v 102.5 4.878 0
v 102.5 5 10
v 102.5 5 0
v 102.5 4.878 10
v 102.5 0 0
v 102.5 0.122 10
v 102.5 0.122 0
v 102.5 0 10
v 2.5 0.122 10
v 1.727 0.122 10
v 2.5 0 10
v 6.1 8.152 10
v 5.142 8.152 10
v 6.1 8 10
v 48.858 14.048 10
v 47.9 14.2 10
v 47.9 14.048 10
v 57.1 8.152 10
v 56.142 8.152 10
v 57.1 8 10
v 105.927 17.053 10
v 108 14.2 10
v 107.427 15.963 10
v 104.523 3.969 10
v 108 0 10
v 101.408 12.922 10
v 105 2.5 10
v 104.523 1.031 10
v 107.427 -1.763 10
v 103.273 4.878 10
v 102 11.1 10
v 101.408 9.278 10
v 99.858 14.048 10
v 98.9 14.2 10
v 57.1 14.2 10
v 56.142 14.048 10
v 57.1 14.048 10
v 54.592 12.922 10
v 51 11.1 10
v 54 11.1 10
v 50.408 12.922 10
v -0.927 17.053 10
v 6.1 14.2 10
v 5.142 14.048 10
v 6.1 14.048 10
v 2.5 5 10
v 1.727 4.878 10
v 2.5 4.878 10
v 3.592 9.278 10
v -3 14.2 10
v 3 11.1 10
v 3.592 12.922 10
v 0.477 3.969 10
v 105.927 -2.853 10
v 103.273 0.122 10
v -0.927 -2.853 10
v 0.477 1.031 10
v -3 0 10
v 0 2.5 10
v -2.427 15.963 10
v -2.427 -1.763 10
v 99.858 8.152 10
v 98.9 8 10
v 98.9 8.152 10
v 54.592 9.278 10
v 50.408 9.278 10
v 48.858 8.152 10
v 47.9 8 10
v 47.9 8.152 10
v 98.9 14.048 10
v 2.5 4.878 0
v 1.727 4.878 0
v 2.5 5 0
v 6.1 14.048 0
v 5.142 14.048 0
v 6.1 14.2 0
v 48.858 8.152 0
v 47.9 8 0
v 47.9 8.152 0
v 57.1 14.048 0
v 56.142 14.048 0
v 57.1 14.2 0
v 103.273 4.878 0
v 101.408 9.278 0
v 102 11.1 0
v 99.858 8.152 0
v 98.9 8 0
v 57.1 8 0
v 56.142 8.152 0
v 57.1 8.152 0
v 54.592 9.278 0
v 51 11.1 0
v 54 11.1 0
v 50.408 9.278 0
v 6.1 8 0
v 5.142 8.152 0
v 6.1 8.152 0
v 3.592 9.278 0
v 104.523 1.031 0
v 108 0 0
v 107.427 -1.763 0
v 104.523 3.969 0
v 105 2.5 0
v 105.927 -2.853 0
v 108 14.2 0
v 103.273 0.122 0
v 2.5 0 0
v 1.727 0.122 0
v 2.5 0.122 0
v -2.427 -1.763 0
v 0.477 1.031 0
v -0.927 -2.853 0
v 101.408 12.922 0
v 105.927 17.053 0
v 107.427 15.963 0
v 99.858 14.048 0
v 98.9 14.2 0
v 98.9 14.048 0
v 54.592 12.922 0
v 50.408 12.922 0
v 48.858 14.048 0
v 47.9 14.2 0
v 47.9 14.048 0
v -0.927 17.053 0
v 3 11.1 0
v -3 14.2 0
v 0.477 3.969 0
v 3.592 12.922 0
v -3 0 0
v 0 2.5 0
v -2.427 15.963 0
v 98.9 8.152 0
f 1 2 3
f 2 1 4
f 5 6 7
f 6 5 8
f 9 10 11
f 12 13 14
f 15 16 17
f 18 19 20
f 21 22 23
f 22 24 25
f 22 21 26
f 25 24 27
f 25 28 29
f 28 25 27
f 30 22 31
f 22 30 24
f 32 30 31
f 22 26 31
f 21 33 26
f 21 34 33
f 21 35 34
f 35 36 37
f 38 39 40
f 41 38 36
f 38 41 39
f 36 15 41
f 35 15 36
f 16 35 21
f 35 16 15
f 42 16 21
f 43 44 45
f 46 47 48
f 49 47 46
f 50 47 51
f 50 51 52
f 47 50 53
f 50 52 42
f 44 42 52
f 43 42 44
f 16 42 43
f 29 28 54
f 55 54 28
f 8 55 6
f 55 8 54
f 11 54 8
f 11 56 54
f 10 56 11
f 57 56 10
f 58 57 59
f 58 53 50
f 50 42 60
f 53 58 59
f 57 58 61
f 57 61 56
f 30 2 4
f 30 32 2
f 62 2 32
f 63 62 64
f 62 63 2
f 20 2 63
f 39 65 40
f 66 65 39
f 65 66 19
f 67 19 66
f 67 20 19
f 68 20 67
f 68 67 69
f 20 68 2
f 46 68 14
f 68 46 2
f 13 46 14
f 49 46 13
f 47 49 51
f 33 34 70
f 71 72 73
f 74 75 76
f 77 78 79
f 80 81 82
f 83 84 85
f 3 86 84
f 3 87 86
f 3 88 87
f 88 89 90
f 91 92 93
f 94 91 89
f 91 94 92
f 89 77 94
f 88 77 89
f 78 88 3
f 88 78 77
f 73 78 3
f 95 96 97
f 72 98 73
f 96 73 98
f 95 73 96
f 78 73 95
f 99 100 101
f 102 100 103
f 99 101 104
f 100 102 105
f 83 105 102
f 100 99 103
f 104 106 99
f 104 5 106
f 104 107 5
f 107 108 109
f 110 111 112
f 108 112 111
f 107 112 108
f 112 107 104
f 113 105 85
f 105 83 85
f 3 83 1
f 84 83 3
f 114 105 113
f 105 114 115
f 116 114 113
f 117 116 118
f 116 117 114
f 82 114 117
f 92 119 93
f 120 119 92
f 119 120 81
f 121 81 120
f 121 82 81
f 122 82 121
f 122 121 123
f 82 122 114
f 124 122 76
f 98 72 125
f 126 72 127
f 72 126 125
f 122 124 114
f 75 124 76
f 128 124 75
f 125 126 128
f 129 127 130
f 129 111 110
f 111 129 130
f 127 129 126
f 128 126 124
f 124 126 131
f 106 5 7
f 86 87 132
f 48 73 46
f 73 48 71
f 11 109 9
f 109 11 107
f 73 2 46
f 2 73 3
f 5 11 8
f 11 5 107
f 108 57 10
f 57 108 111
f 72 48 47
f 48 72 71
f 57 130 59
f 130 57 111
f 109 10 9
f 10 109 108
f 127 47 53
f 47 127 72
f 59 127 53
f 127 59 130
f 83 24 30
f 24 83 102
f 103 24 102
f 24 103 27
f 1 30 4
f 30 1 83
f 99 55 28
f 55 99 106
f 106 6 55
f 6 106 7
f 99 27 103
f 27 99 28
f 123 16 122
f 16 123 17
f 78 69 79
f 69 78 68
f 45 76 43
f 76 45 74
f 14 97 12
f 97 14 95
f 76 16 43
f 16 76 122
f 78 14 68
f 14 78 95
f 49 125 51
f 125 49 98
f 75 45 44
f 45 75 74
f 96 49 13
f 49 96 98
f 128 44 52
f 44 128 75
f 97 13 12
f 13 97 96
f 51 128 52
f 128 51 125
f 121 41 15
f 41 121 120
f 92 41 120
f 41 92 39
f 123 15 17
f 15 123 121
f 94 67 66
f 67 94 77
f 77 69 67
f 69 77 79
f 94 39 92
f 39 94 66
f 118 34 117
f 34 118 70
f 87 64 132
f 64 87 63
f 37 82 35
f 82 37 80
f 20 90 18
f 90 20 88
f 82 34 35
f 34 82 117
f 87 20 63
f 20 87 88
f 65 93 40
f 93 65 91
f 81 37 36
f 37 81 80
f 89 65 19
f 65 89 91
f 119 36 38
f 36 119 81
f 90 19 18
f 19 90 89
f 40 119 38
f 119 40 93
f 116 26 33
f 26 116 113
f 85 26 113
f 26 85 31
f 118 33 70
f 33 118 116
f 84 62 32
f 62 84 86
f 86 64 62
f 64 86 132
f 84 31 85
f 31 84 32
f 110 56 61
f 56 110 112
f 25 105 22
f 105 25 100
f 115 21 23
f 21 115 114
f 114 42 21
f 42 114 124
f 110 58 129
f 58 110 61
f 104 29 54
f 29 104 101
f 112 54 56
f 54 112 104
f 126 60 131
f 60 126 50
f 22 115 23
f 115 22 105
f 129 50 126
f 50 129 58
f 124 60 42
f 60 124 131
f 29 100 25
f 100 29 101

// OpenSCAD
slot_length=105;
slot_width=5;

molle_length=48;
molle_distance=3;
molle_width=6.2;

wall_width=3;
molle_separator_width=wall_width;


depth=10;

$fn=10;

module base() {
    //width excluding 'minkowsky' sum
  internal_width = slot_width + wall_width + molle_width;
  minkowski() {
    cube([slot_length, internal_width, 0.5*depth], center=false);
    cylinder(r=wall_width, h=0.5*depth, center=false);
}
}

module slot_cube(length, width, depth) {
    cube_length = length-width;
    translate([0.5*width, 0, 0]){
    cube([cube_length, width, depth], center=false);
    translate([0, 0.5*width, 0]) {cylinder(h=depth, d=width, center=false);}
    translate([cube_length, 0.5*width, 0]) {cylinder(h=depth, d=width, center=false);}
}}

module gen_molle_slots(length) {
    molle_target_length=length-2*wall_width;
    echo ("molle_target_length", molle_target_length);
    count = floor((molle_target_length + molle_separator_width) / (molle_length + molle_separator_width));
    echo ("count", count);
    molle_total_length = count*molle_length + (count-1) * molle_separator_width;
    echo ("molle_total_length1", molle_total_length);
    initial_offset = 0.5 * (length - molle_total_length);
    echo("initia_offset", initial_offset);
    for(i = [0:count-1]) {
        offset = initial_offset + (molle_length+wall_width)*i;
        echo ("offset", offset, i);
        translate([offset, 0, 0]) {slot_cube(molle_length, molle_width, depth);}
    }

}



difference() {
  base();
  slot_cube(slot_length, slot_width, depth);
  translate([0, slot_width + wall_width, 0]) gen_molle_slots(slot_length);
}
